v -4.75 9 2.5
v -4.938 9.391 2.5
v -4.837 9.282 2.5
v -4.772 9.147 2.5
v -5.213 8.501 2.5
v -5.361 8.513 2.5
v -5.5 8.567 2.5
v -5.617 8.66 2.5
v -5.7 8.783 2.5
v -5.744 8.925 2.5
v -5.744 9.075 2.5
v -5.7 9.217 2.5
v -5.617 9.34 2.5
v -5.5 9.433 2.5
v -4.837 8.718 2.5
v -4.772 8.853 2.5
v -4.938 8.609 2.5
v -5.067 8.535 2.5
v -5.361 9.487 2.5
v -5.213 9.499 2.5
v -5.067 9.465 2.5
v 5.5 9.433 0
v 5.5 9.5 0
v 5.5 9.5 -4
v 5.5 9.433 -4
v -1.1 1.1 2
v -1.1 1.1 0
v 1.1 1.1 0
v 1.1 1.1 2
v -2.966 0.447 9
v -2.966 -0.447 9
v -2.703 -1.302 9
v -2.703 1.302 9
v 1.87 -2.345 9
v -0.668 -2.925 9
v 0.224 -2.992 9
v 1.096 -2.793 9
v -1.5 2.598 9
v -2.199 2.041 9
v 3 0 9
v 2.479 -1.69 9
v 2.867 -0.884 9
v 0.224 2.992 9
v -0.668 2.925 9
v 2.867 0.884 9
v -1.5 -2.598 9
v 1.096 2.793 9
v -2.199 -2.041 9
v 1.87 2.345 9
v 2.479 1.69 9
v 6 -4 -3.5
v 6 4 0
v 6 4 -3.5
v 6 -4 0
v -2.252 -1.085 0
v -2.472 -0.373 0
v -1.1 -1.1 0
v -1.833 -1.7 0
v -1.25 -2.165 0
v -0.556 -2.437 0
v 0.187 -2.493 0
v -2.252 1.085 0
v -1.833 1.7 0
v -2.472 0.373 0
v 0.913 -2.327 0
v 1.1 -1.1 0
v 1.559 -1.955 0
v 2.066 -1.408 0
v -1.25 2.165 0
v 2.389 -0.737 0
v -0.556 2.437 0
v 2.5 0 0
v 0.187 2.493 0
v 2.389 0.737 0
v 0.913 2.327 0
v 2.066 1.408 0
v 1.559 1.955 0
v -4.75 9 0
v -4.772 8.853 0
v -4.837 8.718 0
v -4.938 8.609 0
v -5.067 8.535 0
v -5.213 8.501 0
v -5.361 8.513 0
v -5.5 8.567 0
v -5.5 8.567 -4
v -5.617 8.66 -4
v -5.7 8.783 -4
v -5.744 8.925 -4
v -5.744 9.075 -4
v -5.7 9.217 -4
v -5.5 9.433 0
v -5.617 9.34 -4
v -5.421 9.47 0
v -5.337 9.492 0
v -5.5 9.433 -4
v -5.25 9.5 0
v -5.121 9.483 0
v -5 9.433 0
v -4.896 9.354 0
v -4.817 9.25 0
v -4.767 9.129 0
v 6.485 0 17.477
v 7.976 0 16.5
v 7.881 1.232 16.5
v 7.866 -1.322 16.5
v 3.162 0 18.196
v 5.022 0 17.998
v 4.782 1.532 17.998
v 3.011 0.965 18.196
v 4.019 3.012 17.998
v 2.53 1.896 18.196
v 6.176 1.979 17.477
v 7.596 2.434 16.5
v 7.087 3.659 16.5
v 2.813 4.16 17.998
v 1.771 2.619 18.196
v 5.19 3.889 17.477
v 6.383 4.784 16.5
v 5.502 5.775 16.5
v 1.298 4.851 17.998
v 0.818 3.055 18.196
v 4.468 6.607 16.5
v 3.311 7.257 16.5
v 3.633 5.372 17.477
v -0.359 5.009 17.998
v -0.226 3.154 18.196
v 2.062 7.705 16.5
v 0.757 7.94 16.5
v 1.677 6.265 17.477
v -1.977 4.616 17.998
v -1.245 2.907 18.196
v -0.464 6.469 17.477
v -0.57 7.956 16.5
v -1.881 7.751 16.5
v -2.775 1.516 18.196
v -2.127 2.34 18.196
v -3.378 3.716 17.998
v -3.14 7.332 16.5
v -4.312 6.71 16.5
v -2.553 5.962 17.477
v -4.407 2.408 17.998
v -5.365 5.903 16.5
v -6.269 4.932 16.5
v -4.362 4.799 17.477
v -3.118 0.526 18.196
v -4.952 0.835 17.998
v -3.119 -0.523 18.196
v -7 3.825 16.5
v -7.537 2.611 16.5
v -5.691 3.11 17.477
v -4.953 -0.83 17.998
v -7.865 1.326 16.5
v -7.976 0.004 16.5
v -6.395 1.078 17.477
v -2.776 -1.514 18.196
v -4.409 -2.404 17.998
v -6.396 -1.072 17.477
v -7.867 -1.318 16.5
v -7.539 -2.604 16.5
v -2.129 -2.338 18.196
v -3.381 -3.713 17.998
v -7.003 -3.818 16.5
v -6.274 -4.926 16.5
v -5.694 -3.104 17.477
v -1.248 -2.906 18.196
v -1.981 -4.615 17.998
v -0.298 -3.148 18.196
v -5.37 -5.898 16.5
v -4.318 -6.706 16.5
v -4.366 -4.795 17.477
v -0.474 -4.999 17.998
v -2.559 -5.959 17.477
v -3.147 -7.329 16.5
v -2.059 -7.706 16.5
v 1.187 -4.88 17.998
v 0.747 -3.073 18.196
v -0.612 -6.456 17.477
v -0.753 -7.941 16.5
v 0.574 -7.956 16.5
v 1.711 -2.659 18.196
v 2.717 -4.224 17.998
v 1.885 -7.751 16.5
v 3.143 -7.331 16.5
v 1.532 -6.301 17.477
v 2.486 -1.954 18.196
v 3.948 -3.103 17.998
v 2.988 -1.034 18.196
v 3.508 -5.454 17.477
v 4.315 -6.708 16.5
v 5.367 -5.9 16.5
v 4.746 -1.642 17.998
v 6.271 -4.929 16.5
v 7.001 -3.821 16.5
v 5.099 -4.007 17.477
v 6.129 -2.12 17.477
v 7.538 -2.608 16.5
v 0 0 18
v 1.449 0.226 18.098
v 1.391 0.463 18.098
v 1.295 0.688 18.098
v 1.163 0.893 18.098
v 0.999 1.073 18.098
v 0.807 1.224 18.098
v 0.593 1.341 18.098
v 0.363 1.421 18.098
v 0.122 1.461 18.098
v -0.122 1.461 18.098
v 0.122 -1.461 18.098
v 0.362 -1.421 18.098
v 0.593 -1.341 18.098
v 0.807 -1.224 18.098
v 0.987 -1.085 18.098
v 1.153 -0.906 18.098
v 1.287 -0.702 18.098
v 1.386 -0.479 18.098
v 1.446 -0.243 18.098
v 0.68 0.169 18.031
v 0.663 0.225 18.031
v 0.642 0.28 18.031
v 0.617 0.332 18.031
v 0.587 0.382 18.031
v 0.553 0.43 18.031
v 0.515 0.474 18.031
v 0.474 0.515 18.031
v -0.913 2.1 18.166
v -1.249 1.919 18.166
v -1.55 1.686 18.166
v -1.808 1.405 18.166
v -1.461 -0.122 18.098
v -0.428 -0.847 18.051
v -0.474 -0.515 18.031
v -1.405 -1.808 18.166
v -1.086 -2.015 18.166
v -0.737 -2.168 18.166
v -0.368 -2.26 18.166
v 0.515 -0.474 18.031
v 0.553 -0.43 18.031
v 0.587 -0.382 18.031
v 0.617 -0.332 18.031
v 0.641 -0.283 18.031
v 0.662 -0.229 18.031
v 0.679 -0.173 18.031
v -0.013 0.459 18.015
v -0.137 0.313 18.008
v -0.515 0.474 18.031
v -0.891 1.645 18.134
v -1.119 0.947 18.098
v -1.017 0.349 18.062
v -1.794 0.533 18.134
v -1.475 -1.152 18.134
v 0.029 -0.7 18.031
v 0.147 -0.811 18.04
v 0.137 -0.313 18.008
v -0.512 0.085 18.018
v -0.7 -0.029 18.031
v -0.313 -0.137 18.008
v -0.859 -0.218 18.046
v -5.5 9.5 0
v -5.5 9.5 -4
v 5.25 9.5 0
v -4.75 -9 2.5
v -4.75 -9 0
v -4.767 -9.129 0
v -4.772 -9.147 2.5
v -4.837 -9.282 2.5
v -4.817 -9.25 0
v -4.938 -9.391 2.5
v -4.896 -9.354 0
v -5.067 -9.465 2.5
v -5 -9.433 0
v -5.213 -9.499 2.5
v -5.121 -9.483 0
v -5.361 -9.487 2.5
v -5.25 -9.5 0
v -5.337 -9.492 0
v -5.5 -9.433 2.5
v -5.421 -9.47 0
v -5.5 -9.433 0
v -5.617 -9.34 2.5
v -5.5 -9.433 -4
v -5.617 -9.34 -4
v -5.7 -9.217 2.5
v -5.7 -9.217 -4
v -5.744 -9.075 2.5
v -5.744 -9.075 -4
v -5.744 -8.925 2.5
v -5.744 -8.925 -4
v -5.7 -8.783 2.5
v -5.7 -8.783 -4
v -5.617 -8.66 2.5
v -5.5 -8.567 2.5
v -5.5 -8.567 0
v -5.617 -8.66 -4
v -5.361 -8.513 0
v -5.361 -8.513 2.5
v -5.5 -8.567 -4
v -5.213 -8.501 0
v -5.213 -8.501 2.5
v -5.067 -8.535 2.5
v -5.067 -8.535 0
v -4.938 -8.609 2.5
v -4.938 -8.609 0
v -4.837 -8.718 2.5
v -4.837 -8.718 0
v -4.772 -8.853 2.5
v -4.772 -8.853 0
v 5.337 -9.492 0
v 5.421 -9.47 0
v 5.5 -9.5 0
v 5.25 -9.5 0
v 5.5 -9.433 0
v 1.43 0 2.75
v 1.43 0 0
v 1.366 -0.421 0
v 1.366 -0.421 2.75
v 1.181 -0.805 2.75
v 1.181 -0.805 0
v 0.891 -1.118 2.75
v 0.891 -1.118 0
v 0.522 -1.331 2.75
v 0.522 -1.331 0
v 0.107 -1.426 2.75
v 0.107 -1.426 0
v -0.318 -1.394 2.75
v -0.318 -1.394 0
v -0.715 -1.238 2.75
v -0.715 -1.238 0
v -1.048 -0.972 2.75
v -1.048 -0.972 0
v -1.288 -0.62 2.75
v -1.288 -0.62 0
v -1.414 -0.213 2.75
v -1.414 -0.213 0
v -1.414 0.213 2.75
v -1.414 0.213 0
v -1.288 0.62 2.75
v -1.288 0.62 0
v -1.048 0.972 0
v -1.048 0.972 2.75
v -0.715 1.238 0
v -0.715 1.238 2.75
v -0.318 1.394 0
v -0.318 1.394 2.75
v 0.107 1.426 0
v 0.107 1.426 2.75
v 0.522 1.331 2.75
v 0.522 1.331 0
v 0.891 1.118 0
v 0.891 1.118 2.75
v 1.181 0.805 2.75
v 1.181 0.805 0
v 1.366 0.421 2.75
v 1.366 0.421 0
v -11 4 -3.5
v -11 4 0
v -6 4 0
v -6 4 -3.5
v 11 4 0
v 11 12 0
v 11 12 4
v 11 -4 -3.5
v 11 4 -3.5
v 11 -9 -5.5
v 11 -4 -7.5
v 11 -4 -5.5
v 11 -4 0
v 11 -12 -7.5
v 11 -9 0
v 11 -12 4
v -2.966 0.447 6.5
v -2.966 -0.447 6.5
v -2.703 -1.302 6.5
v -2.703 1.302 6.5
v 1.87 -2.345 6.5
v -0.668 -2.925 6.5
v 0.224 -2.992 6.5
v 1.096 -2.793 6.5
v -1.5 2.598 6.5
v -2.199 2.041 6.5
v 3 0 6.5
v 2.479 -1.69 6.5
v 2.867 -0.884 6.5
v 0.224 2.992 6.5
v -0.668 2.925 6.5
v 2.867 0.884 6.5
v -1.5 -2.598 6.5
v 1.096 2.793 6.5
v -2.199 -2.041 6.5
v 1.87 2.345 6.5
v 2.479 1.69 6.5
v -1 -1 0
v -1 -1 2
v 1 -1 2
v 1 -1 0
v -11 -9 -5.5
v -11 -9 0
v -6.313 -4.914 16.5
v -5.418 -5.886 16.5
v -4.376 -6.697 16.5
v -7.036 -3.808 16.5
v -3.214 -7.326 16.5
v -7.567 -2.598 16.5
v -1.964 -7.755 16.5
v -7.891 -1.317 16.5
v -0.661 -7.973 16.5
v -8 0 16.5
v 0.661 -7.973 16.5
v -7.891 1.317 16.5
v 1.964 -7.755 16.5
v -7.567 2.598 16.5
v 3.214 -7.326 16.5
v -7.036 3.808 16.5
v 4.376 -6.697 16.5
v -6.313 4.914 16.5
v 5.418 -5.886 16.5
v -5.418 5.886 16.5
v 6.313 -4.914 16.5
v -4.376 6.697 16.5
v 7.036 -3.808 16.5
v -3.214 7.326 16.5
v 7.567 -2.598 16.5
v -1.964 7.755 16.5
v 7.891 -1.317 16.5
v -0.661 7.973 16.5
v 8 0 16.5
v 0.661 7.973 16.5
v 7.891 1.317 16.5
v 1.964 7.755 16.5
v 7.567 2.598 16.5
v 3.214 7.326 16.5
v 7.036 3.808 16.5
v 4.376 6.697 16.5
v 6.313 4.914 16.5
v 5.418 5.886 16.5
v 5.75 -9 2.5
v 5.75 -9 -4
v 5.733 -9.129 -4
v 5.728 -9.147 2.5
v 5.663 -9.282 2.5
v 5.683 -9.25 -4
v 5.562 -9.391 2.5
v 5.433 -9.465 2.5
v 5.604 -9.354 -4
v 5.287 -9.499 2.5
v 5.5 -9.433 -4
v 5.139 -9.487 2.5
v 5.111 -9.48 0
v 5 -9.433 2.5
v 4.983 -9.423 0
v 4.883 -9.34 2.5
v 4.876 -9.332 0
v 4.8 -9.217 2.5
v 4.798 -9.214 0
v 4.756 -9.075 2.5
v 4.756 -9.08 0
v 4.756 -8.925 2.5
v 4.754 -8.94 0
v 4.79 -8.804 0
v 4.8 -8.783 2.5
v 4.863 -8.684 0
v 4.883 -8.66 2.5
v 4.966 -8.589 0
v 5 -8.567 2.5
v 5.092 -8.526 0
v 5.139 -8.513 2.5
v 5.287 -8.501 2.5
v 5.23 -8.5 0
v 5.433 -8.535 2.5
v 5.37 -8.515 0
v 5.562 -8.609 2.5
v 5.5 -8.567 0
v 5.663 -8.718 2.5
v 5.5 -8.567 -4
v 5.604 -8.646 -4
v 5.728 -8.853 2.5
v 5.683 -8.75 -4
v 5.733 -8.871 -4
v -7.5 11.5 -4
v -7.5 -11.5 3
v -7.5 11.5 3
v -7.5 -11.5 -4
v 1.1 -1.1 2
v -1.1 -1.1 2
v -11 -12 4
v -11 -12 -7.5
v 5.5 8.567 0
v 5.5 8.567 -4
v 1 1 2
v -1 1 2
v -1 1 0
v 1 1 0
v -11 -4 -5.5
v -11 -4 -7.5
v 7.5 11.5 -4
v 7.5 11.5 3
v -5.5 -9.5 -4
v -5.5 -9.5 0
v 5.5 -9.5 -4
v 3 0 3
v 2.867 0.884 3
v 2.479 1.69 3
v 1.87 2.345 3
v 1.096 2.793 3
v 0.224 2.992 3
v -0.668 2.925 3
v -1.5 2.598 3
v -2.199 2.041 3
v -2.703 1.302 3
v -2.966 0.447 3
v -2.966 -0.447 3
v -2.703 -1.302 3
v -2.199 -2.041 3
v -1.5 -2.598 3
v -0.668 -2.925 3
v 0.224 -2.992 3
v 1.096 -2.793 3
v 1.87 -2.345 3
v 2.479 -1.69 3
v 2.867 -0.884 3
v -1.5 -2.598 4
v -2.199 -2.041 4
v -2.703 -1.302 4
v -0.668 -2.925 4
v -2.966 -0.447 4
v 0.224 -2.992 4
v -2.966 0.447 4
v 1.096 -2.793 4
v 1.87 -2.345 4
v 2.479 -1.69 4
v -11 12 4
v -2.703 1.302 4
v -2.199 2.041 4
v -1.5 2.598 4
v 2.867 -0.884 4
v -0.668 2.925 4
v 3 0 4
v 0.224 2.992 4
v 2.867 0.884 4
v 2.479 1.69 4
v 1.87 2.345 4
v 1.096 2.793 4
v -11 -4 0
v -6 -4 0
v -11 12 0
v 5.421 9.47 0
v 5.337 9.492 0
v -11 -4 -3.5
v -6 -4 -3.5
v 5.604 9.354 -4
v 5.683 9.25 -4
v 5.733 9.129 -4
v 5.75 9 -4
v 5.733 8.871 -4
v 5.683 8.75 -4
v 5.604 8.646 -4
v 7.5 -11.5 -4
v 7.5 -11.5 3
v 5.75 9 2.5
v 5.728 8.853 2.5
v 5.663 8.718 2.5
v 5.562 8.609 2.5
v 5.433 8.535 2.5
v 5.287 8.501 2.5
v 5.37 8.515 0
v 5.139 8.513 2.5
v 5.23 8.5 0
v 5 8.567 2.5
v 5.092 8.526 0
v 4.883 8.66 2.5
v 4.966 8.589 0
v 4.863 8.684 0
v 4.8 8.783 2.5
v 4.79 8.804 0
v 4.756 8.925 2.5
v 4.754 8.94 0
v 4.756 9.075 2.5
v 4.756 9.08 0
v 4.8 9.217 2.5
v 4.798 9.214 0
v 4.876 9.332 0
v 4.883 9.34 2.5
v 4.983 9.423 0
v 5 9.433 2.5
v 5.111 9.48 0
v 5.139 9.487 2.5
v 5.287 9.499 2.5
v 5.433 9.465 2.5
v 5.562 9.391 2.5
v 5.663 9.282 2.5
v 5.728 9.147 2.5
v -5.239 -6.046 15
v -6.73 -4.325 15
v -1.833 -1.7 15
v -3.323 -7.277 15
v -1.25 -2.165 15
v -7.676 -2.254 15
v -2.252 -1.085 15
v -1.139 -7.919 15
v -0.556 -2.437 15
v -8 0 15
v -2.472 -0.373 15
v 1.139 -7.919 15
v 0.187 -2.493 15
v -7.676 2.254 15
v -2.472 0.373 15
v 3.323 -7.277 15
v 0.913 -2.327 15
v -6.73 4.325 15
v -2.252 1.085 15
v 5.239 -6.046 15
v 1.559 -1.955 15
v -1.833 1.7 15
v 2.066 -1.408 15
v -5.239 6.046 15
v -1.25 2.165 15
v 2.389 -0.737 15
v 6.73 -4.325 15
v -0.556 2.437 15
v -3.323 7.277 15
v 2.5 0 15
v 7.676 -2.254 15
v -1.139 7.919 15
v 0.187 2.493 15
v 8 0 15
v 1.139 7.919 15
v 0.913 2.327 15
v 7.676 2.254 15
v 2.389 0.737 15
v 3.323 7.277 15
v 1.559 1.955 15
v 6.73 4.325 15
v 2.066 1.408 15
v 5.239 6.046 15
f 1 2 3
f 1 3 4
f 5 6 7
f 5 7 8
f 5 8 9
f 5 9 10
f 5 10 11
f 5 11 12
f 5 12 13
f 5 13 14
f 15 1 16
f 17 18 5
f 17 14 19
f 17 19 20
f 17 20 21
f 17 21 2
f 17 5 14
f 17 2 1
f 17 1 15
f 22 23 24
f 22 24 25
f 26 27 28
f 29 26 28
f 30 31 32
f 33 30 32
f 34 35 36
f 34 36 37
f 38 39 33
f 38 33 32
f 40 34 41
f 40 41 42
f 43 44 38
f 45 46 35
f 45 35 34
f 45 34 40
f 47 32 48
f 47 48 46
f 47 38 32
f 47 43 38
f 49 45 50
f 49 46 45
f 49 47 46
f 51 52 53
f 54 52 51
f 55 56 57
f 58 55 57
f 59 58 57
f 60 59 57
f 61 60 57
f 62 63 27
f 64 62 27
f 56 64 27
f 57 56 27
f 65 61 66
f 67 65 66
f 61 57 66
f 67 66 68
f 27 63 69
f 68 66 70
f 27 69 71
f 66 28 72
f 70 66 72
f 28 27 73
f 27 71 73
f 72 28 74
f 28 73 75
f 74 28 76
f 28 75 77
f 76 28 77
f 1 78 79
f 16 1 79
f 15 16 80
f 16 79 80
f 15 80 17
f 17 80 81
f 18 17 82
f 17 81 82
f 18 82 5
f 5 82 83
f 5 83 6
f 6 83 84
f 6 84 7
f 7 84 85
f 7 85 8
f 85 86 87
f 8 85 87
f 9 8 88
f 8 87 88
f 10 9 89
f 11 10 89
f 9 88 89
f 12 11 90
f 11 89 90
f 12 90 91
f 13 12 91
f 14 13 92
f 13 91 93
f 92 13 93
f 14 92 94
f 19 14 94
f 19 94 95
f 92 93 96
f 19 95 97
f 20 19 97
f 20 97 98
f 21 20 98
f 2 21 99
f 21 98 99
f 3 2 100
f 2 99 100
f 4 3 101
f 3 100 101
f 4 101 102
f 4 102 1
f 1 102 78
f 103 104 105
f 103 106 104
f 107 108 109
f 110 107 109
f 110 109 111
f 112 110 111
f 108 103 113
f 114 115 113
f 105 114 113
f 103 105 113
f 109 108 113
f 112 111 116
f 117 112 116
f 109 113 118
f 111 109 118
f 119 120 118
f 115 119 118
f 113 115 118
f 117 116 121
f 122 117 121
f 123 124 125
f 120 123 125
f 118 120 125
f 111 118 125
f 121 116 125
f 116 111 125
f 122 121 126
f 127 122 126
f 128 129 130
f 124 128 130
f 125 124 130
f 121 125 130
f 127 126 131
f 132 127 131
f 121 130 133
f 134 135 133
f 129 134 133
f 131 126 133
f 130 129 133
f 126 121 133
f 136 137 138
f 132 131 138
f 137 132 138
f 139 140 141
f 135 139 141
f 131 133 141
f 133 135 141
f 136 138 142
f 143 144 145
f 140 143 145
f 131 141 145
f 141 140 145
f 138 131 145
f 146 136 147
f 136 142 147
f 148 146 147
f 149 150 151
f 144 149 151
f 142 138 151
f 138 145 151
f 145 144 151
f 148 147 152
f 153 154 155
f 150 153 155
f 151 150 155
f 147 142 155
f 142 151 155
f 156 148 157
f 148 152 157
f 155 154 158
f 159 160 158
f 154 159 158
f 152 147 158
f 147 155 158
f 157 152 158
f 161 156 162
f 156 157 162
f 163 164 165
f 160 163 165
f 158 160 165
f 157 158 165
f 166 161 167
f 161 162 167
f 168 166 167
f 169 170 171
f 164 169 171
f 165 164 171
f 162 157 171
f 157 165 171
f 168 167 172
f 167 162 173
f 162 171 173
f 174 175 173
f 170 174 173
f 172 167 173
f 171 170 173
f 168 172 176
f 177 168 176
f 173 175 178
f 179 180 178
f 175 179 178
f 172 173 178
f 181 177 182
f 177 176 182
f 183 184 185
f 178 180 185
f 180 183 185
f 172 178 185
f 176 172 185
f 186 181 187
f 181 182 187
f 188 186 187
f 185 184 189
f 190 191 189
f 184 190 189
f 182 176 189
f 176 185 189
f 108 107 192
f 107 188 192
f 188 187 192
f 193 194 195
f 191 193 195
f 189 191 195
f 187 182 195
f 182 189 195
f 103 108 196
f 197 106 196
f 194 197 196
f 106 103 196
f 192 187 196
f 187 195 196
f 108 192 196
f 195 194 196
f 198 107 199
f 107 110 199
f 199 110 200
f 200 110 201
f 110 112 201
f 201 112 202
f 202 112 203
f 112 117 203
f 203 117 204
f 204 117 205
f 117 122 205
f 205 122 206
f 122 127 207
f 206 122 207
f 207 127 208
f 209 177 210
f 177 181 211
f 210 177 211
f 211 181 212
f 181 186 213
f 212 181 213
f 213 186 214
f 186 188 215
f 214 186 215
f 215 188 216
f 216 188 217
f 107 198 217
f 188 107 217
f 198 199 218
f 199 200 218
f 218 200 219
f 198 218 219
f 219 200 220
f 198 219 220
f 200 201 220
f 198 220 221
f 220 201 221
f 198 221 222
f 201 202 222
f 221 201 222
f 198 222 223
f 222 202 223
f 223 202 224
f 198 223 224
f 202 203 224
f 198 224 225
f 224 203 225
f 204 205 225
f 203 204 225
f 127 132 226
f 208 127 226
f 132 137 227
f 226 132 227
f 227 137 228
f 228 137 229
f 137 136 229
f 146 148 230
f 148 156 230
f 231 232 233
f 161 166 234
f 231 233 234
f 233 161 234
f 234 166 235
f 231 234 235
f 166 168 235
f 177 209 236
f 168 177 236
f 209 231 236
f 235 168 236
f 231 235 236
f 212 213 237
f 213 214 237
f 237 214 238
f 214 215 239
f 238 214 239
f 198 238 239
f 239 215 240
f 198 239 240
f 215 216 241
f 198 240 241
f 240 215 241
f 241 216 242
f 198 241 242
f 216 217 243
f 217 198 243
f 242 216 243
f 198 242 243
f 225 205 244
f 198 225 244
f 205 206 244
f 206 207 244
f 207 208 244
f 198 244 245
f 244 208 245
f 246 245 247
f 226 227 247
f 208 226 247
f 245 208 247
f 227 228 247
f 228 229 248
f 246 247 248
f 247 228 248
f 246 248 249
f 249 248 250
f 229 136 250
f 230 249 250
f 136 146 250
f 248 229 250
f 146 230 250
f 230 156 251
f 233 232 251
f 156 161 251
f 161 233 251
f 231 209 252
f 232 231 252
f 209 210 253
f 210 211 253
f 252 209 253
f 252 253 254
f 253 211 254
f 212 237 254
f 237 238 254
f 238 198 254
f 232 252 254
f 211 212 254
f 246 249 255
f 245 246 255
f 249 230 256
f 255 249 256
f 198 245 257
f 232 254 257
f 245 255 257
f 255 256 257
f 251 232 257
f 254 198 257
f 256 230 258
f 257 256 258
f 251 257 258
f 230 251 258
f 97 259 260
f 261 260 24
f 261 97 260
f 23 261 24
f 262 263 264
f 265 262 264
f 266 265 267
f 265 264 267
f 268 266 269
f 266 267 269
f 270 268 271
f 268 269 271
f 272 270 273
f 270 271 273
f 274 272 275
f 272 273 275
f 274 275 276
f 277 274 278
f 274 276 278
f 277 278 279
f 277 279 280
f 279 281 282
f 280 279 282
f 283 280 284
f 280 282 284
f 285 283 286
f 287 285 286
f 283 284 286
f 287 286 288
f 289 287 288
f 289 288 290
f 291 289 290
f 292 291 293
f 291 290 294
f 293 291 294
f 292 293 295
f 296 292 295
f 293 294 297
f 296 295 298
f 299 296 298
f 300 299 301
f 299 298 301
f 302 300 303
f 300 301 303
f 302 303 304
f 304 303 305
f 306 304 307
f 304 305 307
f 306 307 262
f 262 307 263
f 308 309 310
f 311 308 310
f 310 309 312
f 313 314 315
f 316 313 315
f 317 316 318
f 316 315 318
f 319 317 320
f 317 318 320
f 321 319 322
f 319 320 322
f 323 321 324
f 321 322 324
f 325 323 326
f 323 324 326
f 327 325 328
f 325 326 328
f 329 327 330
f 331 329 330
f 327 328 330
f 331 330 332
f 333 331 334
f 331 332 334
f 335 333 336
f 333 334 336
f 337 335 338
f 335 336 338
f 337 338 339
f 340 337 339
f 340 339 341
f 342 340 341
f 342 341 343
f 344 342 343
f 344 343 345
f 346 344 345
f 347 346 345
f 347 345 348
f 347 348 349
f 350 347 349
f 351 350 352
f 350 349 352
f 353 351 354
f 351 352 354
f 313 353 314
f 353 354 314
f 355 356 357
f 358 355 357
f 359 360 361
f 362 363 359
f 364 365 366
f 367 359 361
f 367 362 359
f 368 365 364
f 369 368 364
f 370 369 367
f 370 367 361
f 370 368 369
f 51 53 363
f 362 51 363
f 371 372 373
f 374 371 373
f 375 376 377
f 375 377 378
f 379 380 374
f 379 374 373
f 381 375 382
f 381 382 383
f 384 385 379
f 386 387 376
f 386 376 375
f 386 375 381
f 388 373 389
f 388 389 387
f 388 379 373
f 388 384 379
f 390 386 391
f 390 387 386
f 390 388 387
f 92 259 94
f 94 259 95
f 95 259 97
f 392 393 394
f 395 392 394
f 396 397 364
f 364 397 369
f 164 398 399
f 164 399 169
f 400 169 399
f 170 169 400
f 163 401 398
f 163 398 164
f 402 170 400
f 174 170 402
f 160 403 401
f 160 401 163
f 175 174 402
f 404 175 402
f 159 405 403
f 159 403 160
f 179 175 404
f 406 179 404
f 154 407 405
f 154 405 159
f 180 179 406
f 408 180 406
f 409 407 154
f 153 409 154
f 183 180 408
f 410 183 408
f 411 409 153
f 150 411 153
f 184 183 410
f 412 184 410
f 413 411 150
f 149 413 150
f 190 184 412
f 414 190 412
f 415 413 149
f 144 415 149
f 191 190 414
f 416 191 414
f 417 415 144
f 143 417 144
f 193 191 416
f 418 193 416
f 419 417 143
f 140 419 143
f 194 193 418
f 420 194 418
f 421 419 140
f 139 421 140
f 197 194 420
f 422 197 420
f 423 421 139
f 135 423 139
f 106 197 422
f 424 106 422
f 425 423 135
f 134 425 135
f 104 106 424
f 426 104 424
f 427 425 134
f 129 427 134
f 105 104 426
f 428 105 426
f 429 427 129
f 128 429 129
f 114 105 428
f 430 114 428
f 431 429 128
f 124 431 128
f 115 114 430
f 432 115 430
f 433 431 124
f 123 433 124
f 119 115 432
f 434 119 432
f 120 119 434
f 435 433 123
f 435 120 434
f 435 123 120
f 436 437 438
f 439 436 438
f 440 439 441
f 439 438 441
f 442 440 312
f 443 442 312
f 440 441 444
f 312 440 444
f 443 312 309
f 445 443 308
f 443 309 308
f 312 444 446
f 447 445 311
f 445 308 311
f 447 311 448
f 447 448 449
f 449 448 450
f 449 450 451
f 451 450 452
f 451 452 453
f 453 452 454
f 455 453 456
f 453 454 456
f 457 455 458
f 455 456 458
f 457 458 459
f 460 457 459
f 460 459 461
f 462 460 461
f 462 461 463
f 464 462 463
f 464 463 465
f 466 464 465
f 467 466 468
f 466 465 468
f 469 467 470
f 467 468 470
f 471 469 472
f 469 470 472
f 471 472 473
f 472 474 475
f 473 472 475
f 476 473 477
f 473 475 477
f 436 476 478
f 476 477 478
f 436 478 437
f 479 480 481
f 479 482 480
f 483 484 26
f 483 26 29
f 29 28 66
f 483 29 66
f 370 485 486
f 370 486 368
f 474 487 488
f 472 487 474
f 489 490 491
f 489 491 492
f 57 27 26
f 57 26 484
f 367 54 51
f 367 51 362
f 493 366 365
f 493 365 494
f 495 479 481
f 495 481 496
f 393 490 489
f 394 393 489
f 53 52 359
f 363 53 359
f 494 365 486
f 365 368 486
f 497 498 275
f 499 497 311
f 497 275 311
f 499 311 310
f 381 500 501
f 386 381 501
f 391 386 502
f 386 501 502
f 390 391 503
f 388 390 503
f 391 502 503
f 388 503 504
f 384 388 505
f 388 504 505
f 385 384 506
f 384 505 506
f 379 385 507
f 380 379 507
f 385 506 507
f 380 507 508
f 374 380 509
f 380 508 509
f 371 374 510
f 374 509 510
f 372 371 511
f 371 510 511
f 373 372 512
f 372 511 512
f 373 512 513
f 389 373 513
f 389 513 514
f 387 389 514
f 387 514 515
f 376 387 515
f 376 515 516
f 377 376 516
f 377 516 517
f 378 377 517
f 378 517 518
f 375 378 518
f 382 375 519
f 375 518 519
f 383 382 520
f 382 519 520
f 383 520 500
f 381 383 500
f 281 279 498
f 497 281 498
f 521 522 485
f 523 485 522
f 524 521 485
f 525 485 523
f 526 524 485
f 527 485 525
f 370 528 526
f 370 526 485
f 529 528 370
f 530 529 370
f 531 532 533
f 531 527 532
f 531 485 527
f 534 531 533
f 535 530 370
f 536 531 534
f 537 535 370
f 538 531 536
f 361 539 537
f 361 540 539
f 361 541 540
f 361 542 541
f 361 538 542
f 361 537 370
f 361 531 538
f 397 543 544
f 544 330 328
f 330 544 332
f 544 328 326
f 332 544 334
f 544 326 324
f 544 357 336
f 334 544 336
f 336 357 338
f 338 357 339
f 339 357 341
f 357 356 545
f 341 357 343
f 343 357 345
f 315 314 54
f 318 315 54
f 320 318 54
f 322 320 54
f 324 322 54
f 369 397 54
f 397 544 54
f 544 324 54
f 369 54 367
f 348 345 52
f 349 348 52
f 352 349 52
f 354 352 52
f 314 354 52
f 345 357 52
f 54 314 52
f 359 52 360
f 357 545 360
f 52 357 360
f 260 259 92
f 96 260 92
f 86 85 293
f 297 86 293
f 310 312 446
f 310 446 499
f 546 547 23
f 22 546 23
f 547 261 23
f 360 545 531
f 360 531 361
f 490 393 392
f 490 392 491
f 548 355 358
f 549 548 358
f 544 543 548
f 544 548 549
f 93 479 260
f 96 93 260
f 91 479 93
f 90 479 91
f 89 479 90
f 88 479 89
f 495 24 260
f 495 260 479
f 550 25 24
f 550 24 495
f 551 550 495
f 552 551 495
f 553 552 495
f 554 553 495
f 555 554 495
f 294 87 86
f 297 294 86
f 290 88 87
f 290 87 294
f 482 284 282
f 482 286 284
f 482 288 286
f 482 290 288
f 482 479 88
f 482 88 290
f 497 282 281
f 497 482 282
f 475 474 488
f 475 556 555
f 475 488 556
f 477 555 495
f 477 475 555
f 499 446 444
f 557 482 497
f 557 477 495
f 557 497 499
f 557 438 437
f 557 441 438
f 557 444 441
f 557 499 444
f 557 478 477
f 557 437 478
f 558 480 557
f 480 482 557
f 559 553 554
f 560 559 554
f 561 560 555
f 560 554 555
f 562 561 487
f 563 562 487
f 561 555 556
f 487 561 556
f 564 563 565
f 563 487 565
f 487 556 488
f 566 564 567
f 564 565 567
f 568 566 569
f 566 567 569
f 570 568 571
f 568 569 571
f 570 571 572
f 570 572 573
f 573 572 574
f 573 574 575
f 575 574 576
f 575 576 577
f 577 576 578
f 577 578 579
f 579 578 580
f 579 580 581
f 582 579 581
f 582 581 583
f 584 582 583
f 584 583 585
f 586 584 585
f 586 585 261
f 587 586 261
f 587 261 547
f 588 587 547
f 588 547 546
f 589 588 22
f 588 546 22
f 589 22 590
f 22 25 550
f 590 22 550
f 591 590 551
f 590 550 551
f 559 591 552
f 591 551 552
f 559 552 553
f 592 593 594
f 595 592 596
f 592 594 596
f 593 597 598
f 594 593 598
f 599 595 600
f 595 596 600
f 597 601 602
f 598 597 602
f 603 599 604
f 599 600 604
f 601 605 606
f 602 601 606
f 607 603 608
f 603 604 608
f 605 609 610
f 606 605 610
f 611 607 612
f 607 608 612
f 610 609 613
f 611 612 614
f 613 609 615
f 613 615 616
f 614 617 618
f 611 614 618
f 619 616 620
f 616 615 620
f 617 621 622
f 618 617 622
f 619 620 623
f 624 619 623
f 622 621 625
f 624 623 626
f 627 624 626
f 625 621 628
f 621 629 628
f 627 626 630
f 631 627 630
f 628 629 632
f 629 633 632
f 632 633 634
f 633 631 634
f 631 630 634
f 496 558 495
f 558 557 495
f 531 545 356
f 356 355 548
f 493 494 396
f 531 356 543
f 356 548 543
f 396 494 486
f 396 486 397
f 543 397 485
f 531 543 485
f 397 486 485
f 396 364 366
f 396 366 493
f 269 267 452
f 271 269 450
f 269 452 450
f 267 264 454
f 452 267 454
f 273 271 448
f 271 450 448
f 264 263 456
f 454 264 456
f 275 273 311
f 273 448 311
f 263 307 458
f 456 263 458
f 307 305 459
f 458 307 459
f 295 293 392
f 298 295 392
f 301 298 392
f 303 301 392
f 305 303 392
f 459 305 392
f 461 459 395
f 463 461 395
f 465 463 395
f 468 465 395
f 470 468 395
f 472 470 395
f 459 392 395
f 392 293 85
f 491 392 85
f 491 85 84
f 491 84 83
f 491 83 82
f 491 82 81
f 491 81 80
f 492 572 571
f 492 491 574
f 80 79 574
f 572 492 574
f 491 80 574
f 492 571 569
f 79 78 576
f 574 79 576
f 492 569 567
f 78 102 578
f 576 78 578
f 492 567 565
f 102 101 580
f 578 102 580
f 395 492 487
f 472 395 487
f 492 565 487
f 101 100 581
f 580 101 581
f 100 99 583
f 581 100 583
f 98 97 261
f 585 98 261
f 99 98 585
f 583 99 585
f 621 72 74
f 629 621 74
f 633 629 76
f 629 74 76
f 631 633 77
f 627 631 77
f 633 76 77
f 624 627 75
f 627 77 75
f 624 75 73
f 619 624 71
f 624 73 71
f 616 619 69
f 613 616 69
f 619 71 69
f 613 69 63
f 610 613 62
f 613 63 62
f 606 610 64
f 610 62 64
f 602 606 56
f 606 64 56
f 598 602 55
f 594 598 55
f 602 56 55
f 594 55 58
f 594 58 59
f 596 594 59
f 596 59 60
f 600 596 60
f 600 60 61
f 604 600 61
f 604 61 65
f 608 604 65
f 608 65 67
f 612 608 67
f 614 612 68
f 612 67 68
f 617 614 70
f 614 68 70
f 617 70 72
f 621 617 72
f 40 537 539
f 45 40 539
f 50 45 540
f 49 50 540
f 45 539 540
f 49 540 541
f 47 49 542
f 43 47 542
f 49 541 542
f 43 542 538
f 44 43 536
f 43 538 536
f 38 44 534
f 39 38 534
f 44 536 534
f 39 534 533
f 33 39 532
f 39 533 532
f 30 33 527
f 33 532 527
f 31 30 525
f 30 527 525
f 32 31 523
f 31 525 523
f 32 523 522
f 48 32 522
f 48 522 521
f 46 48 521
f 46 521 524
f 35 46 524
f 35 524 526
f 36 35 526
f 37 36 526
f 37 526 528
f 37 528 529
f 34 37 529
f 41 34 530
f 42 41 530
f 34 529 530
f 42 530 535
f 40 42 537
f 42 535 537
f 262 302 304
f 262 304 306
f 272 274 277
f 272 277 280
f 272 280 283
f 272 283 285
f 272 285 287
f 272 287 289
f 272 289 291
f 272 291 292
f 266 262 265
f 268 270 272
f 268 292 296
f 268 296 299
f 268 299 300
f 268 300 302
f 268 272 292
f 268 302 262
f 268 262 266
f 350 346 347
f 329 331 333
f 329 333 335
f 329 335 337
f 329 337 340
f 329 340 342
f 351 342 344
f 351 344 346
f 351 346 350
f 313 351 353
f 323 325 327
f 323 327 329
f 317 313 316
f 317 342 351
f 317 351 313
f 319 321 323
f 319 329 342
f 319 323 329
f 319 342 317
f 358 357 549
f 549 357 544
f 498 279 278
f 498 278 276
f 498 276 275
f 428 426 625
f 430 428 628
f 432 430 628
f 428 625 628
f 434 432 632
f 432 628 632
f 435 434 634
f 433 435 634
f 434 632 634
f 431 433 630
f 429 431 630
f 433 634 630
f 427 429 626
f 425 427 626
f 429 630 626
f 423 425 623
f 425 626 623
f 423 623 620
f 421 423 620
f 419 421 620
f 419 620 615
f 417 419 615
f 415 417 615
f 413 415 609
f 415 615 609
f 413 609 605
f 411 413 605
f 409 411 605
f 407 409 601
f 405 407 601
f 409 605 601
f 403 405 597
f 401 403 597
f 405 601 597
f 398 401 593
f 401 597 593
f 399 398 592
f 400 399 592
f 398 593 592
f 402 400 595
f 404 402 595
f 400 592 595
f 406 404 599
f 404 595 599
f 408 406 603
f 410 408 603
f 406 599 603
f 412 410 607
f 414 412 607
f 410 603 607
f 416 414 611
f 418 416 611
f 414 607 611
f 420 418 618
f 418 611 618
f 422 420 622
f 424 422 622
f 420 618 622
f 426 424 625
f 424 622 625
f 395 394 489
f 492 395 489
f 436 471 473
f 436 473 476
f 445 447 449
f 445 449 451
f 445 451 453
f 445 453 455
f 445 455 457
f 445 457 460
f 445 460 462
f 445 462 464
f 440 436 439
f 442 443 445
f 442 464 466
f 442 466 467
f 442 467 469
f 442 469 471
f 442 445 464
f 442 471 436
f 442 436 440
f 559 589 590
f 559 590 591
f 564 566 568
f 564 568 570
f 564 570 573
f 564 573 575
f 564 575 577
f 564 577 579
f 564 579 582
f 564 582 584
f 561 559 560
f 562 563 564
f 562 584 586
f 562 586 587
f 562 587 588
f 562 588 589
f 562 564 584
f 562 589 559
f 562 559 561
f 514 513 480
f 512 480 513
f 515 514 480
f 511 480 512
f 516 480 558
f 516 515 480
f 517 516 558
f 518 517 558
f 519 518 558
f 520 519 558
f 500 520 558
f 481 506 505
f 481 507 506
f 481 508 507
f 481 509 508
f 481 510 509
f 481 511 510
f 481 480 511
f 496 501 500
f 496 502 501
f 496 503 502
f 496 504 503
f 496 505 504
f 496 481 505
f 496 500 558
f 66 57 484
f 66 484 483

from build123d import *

# Parameters (mm, degrees)
SKETCH_R        = 2.5
PAD_DEPTH       = 15
SKETCH001_W     = 2.2
SKETCH001_H     = 2.2
POCKET_DEPTH    = 2
SKETCH002_R     = 8
PAD001_DEPTH    = 1.5
SKETCH004_W     = 22
SKETCH004_H     = 24
PAD002_DEPTH    = 4
SKETCH005_R     = 1.429715
POCKET001_DEPTH = 2.75
SKETCH007_W     = 5
SKETCH007_H     = 8
PAD004_DEPTH    = 3.5
SKETCH008_W     = 22
SKETCH008_H     = 3
PAD005_DEPTH    = 7.5
SKETCH009_W     = 22
SKETCH009_H     = 2
PAD006_DEPTH    = 5
SKETCH010_R     = 3
PAD007_DEPTH    = 5
SKETCH011_W     = 15
SKETCH011_H     = 23
PAD008_DEPTH    = 2
SKETCH012_W     = 2
SKETCH012_H     = 2
POCKET002_DEPTH = 5
SKETCH013_W     = 15
SKETCH013_H     = 23
SKETCH013_W_2   = 11
SKETCH013_H_2   = 19
PAD009_DEPTH    = 4
SKETCH015_W     = 15
SKETCH015_H     = 23
PAD010_DEPTH    = 1
SKETCH016_R     = 3
PAD011_DEPTH    = 3.5
SKETCH014_R     = 0.5
POCKET003_DEPTH = 6.5


with BuildPart() as paddle:
    # Sketch → Pad (new body)
    with BuildSketch(Plane.XY):
        Circle(SKETCH_R)
    extrude(amount=PAD_DEPTH)

    # Sketch001 (on Face2 of Pad) → Pocket (cut)
    with BuildSketch(Plane(origin=(0, 0, 0), x_dir=(1, 0, 0), z_dir=(0, 0, -1))):
        Rectangle(SKETCH001_W, SKETCH001_H)
    extrude(amount=-POCKET_DEPTH, mode=Mode.SUBTRACT)

    # Sketch002 (on Face3 of Pocket) → Pad001 (join)
    with BuildSketch(Plane.XY.offset(15)):
        Circle(SKETCH002_R)
    extrude(amount=PAD001_DEPTH)

    # Sketch003 → Revolution (revolve)
    with BuildSketch(Plane.XZ):
        with BuildLine():
            Line((0, 18), (0, 16.48024))
            Line((0, 16.48024), (8, 16.48024))
            add(Edge.make_bspline(
                [(0, 18), (2, 18), (5, 19), (8, 16.48024)],
                knots=[0, 0, 0, 0, 1, 1, 1, 1], degree=3))
        make_face()
    revolve(axis=Axis((0, 0, 0), (0, 0, 1)))


with BuildPart() as basetest:
    # Sketch004 → Pad002 (new body)
    with BuildSketch(Plane.XY):
        Rectangle(SKETCH004_W, SKETCH004_H)
    extrude(amount=PAD002_DEPTH)

    # Sketch005 (on Face5 of Pad002) → Pocket001 (cut)
    with BuildSketch(Plane(origin=(0, 0, 0), x_dir=(1, 0, 0), z_dir=(0, 0, -1))):
        Circle(SKETCH005_R)
    extrude(amount=-POCKET001_DEPTH, mode=Mode.SUBTRACT)

    # Sketch007 → Pad004 (join)
    with BuildSketch(Plane(origin=(0, 0, 0), x_dir=(1, 0, 0), z_dir=(0, 0, -1))):
        with Locations((-8.5, 0)):
            Rectangle(SKETCH007_W, SKETCH007_H)
        with Locations((8.5, 0)):
            Rectangle(SKETCH007_W, SKETCH007_H)
    extrude(amount=PAD004_DEPTH)

    # Sketch008 (on Face4 of Pad004) → Pad005 (join)
    with BuildSketch(Plane(origin=(0, 0, 0), x_dir=(1, 0, 0), z_dir=(0, 0, -1))):
        with Locations((0, 10.5)):
            Rectangle(SKETCH008_W, SKETCH008_H)
    extrude(amount=PAD005_DEPTH)

    # Sketch009 (on Face14 of Pad005) → Pad006 (join)
    with BuildSketch(Plane(origin=(0, -9, 0), x_dir=(-1, 0, 0), z_dir=(0, 1, 0))):
        with Locations((0, -6.5)):
            Rectangle(SKETCH009_W, SKETCH009_H)
    extrude(amount=PAD006_DEPTH)

    # Sketch010 (on Face5 of Pad006) → Pad007 (join)
    with BuildSketch(Plane.XY.offset(4)):
        Circle(SKETCH010_R)
    extrude(amount=PAD007_DEPTH)


with BuildPart() as test:
    # Sketch011 → Pad008 (new body)
    with BuildSketch(Plane.XY):
        Rectangle(SKETCH011_W, SKETCH011_H)
    extrude(amount=PAD008_DEPTH)

    # Sketch012 (on Face6 of Pad008) → Pocket002 (cut)
    with BuildSketch(Plane.XY.offset(2)):
        Rectangle(SKETCH012_W, SKETCH012_H)
    extrude(amount=-POCKET002_DEPTH, mode=Mode.SUBTRACT)

    # Sketch013 (on Face4 of Pocket002) → Pad009 (join)
    with BuildSketch(Plane(origin=(0, 0, 0), x_dir=(1, 0, 0), z_dir=(0, 0, -1))):
        Rectangle(SKETCH013_W, SKETCH013_H)
        Rectangle(SKETCH013_W_2, SKETCH013_H_2, mode=Mode.SUBTRACT)
    extrude(amount=PAD009_DEPTH)

    # Sketch015 (on Face5 of Pad009) → Pad010 (join)
    with BuildSketch(Plane.XY.offset(2)):
        Rectangle(SKETCH015_W, SKETCH015_H)
    extrude(amount=PAD010_DEPTH)

    # Sketch016 (on Face12 of Pad010) → Pad011 (join)
    with BuildSketch(Plane.XY.offset(3)):
        Circle(SKETCH016_R)
    extrude(amount=PAD011_DEPTH)

    # Sketch014 (on Face11 of Pad011) → Pocket003 (cut)
    with BuildSketch(Plane(origin=(0, 0, -4), x_dir=(1, 0, 0), z_dir=(0, 0, -1))):
        with Locations((-5.25, -9)):
            Circle(SKETCH014_R)
        with Locations((5.25, -9)):
            Circle(SKETCH014_R)
        with Locations((-5.25, 9)):
            Circle(SKETCH014_R)
        with Locations((5.25, 9)):
            Circle(SKETCH014_R)
    extrude(amount=-POCKET003_DEPTH, mode=Mode.SUBTRACT)


solid = Compound([paddle.part, basetest.part, test.part])
